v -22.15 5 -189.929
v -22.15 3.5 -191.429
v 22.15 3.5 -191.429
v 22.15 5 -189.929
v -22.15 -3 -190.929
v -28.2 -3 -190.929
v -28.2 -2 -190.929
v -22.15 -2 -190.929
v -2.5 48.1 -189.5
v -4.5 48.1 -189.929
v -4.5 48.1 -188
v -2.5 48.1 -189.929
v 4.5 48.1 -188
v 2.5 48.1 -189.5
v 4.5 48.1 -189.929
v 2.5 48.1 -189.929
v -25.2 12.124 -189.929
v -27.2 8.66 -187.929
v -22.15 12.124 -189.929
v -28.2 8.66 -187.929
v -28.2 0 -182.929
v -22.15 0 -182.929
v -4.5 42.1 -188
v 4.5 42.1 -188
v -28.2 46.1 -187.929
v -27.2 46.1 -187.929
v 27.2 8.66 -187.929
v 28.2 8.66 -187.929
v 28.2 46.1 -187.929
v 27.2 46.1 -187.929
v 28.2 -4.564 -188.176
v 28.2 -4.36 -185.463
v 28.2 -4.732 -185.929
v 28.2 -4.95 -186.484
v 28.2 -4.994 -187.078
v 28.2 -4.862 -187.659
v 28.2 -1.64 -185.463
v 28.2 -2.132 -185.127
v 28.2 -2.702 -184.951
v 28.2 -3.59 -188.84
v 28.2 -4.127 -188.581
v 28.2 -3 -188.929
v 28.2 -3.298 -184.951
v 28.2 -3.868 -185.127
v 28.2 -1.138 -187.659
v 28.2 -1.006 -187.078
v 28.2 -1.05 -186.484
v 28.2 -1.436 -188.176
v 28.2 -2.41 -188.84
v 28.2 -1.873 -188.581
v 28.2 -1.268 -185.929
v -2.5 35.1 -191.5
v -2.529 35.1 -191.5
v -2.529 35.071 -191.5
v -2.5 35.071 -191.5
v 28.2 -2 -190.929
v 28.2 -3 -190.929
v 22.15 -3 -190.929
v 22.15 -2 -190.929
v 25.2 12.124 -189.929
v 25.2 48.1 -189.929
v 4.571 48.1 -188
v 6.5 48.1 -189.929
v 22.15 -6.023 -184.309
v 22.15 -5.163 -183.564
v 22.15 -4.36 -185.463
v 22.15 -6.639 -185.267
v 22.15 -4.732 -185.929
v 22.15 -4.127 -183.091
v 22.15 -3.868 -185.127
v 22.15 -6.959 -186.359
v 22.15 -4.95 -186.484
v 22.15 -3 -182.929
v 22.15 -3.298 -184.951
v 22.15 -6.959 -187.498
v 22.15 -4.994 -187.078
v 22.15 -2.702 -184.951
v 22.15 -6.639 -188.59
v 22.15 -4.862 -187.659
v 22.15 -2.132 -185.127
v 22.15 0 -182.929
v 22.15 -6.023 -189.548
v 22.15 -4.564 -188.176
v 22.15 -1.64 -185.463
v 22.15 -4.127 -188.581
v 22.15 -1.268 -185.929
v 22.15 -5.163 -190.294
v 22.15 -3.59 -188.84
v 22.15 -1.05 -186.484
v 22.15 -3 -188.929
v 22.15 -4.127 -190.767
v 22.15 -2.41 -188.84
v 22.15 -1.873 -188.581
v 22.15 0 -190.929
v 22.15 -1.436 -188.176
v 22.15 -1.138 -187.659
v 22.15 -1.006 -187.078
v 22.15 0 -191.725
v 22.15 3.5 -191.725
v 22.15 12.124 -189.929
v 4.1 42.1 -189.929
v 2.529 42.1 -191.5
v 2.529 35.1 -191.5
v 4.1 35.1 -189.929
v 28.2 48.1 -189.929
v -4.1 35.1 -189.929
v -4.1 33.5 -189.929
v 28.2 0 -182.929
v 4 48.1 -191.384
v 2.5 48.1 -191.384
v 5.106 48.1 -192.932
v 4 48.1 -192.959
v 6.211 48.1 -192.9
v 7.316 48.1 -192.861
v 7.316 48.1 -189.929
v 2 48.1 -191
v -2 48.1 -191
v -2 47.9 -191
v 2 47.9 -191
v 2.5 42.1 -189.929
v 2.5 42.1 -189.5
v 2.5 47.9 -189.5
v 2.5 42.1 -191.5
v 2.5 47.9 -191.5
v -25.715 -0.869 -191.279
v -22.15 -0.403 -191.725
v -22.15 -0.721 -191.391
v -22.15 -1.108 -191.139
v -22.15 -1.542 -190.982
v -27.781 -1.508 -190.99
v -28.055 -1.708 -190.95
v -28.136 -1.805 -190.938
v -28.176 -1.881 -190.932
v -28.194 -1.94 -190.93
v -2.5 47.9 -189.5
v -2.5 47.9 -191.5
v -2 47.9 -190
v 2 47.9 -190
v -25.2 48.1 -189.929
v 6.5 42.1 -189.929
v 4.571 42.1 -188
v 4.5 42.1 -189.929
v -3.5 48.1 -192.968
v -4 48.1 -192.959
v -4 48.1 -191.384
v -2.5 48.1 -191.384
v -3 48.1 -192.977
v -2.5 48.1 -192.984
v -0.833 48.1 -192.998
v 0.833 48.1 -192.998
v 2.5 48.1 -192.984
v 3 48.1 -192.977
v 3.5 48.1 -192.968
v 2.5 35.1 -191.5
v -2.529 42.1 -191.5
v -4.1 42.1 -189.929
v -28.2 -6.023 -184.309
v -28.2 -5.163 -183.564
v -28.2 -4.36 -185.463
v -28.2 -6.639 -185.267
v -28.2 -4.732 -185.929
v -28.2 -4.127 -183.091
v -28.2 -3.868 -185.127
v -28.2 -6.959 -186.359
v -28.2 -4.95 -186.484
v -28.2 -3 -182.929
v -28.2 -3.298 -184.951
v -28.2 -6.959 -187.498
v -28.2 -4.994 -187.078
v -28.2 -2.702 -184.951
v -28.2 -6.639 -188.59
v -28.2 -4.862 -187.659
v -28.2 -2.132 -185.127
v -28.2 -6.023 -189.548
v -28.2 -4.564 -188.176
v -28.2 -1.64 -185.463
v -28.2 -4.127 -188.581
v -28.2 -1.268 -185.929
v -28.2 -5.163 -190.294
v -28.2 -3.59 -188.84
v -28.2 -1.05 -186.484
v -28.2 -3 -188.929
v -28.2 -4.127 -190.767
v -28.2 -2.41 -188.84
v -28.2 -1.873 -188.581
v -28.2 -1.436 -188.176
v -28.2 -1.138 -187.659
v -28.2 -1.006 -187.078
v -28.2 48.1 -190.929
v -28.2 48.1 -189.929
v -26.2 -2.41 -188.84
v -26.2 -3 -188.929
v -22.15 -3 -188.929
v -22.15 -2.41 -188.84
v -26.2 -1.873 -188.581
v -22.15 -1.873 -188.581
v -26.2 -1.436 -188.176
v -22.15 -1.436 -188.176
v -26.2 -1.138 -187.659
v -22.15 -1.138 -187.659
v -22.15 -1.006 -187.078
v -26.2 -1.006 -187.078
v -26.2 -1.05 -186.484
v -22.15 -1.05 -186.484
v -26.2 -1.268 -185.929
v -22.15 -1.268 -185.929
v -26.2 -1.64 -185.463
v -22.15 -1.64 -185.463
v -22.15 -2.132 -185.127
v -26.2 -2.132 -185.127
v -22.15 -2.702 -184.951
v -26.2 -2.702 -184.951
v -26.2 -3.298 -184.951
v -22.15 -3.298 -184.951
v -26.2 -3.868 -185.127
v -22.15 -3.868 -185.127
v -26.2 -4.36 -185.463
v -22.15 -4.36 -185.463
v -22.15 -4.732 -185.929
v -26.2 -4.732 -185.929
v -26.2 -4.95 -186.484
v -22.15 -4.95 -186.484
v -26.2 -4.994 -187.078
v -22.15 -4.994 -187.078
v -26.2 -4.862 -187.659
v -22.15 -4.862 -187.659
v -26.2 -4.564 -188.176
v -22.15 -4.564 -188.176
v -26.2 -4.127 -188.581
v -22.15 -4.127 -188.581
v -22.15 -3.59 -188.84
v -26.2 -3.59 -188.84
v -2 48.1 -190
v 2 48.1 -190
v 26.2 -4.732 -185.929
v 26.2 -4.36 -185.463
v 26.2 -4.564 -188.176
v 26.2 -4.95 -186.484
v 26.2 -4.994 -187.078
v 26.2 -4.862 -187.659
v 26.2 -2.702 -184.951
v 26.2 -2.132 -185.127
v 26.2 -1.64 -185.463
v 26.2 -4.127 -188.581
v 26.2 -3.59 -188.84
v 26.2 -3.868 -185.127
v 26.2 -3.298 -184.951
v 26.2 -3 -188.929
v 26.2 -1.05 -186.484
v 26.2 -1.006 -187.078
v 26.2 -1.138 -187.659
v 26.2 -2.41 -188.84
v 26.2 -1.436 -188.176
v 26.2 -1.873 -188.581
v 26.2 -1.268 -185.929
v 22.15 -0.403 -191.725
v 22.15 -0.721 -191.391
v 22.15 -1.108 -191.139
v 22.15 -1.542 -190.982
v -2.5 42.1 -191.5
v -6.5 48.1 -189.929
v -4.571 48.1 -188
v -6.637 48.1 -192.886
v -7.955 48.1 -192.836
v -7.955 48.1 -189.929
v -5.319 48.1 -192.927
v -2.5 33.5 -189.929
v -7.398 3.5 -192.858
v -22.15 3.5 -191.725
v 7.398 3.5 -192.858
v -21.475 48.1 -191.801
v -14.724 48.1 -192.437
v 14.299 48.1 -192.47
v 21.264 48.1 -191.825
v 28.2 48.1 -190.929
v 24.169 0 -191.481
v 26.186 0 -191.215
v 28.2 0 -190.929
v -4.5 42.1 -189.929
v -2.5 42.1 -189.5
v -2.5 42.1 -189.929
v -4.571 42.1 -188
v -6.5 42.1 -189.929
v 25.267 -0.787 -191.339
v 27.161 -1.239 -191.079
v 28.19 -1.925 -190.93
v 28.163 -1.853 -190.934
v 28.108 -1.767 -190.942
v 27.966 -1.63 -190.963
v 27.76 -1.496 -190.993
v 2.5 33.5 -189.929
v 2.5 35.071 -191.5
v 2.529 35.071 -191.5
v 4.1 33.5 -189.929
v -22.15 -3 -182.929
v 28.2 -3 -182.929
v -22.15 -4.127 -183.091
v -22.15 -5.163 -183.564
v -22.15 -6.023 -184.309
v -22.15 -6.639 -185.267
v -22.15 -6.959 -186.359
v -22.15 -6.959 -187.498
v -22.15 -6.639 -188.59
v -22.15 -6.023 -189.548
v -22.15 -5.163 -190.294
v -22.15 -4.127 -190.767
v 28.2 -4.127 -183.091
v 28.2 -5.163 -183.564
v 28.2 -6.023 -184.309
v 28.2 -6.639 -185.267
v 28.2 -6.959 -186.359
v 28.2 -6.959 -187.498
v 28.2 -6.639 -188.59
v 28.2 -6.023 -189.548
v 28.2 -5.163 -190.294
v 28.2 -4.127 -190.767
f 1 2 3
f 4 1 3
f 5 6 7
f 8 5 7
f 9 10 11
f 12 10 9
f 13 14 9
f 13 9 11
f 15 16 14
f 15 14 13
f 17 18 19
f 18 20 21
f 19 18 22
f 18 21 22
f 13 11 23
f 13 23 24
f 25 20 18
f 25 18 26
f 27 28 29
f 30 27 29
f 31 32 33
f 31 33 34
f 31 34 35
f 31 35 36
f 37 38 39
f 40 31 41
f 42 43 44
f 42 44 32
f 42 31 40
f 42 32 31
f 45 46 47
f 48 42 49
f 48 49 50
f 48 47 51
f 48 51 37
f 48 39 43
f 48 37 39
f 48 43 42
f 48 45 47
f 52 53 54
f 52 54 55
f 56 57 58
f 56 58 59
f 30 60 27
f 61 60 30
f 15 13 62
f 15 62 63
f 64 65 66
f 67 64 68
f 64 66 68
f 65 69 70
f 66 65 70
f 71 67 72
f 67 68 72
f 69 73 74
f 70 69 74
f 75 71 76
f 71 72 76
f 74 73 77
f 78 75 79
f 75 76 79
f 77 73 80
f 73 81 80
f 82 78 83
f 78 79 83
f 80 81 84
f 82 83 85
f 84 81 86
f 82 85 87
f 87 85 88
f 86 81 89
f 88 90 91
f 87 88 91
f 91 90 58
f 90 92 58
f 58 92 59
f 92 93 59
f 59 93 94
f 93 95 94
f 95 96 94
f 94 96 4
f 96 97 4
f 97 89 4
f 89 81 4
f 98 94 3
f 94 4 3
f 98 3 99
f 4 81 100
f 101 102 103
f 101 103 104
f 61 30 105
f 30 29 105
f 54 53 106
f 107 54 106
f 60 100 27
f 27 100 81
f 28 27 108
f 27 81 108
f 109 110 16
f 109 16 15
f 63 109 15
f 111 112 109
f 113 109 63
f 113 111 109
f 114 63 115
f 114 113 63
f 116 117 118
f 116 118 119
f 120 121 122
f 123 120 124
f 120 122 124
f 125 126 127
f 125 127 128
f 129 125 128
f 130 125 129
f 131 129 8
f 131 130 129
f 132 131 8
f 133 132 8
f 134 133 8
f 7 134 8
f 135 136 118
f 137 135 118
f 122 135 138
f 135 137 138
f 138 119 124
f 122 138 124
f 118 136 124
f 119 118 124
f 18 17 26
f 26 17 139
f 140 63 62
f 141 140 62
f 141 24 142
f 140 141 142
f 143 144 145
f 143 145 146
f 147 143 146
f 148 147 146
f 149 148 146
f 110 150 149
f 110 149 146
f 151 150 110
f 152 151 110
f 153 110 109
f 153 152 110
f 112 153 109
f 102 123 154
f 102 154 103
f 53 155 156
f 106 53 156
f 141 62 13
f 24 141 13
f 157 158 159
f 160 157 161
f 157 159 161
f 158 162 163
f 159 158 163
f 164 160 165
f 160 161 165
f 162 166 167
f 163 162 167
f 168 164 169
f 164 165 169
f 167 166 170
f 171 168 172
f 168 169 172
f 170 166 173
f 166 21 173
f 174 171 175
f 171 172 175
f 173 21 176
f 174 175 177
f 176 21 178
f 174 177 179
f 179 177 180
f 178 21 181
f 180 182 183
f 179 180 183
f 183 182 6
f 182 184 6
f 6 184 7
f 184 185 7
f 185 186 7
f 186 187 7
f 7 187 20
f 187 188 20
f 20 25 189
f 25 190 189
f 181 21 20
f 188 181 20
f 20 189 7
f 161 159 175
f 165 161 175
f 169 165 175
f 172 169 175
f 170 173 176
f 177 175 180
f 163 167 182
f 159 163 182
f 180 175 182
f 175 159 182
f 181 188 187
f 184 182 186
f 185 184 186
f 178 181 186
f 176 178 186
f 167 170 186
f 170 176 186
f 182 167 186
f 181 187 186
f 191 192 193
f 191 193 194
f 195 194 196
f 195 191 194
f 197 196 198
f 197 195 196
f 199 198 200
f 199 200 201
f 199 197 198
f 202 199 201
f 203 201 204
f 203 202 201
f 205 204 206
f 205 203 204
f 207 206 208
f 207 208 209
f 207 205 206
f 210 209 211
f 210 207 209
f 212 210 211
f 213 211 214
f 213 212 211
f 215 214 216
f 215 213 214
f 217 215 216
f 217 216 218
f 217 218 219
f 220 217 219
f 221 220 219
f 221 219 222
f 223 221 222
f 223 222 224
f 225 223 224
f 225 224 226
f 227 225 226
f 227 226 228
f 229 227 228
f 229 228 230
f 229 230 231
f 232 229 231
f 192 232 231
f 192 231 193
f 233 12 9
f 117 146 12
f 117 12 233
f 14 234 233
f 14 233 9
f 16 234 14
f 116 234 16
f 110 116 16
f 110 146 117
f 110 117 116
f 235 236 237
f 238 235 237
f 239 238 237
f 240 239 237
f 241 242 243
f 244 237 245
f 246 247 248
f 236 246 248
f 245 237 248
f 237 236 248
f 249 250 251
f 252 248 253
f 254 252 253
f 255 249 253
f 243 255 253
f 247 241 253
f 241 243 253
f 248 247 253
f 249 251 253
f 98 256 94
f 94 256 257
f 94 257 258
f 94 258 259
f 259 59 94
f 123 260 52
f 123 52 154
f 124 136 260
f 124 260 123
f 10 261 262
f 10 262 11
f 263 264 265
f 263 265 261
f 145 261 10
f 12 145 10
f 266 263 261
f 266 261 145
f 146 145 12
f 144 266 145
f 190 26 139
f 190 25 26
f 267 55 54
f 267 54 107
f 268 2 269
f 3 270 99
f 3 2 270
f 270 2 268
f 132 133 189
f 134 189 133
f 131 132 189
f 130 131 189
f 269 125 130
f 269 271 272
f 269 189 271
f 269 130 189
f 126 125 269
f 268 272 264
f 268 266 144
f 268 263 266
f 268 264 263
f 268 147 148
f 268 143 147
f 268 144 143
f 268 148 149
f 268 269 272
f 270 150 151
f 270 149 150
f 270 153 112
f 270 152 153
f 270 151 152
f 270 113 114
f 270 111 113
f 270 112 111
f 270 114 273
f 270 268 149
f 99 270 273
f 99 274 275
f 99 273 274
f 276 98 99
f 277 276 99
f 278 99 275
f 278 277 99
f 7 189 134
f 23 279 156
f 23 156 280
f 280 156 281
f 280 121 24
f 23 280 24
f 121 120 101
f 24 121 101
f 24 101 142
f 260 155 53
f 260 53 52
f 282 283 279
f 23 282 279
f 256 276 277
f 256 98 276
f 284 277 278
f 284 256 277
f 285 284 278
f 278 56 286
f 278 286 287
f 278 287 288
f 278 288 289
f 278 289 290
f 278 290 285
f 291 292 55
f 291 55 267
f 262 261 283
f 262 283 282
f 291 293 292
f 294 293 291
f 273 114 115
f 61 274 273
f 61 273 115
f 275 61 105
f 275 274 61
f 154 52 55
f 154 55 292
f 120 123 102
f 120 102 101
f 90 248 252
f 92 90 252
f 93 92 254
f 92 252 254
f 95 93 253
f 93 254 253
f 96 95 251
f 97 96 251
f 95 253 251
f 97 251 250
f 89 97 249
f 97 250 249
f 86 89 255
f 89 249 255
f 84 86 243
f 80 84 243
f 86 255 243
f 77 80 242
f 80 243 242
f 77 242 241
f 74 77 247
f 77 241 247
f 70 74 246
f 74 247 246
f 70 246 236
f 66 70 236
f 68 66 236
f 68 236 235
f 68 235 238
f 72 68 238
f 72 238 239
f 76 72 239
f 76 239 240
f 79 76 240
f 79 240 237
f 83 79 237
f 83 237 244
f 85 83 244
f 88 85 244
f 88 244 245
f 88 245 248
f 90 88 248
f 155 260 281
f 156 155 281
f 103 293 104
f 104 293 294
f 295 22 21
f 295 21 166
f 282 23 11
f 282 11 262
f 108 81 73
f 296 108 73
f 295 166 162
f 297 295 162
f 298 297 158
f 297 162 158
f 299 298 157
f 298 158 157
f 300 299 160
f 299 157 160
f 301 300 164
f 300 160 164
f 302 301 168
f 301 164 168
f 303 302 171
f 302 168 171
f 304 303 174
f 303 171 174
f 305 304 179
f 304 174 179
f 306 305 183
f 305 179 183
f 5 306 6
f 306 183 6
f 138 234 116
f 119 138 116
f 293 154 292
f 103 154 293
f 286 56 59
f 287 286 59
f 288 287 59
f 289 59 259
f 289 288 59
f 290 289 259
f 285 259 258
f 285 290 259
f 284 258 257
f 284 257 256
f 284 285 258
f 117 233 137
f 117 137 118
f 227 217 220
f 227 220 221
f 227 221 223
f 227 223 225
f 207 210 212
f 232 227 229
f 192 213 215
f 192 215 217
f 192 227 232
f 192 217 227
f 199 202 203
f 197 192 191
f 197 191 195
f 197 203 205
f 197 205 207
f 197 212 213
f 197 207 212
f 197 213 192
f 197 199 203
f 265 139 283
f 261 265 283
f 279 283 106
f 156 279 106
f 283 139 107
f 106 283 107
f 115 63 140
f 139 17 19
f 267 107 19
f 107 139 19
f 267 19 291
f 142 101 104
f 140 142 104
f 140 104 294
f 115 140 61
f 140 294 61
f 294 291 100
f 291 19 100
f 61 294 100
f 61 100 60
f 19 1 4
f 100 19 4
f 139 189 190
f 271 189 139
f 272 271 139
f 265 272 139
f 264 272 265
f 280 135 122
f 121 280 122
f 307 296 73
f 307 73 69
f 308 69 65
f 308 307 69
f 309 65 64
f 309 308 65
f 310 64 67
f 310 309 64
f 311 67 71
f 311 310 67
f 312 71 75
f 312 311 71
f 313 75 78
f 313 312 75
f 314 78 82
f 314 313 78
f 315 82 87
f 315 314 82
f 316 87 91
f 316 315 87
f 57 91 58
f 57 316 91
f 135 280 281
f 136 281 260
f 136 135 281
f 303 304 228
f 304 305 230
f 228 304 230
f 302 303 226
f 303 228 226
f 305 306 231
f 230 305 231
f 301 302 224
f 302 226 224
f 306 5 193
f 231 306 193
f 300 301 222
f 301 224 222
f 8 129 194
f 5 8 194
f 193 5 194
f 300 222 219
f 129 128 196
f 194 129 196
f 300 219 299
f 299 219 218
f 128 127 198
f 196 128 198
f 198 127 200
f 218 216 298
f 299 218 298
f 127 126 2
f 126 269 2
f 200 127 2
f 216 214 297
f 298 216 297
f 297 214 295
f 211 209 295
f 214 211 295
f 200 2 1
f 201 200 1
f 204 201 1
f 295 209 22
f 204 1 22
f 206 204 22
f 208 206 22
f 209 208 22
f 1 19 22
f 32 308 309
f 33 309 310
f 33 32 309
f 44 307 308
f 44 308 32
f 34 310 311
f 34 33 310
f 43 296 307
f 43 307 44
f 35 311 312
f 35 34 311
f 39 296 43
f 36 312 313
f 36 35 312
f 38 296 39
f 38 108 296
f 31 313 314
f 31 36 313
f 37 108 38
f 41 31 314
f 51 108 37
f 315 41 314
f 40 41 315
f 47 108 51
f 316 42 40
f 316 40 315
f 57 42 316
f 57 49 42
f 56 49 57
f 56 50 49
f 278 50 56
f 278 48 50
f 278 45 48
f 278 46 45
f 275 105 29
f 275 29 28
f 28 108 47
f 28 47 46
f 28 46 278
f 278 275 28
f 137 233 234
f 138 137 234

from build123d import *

# Parameters (mm, degrees)
BOSS_EXTRUDE1_DEPTH       = 48.1
SKETCH2_R                 = 2
BOSS_EXTRUDE2_DEPTH       = 6.05
CHAMFER1_SIZE2            = 7
CHAMFER1_SIZE             = 12.124355653
CHAMFER1_OF_MIRROR1_SIZE2 = 7
CHAMFER1_OF_MIRROR1_SIZE  = 12.124355653
BOSS_EXTRUDE3_DEPTH       = 1
CHAMFER2_SIZE             = 2
SKETCH4_W                 = 44.3
SKETCH4_H                 = 3.5
LITTLE_BIT_OF_SPACE_DEPTH = 57.194750645
CHAMFER3_SIZE             = 1.5
FILLET1_R                 = 2
SKETCH5_W                 = 9
SKETCH5_H                 = 1.928677783
BOSS_EXTRUDE4_DEPTH       = 6
SKETCH6_W                 = 5
SKETCH6_H                 = 2
CUT_EXTRUDE2_DEPTH        = 13
SKETCH7_W                 = 5
SKETCH7_H                 = 2
SKETCH7_W_2               = 4
SKETCH7_H_2               = 1
BOSS_EXTRUDE5_DEPTH       = 0.2
BOSS_EXTRUDE7_DEPTH       = 1.5
CHAMFER6_SIZE             = 1.5
CHAMFER7_SIZE             = 1.6
CHAMFER8_SIZE             = 2
SKETCH10_W                = 15.27160506
SKETCH10_H                = 9.874411304
CUT_EXTRUDE3_DEPTH        = 203.6826338
SKETCH11_R                = 2
BOSS_EXTRUDE8_DEPTH       = 2


# Read off the part's stored shape, not the designer's step: Boss-Extrude1
# Some blends are built 0.0001 mm under size
with BuildPart() as part:
    # Boss-Extrude1 outline → Boss-Extrude1 (new body)
    with BuildSketch(Plane(origin=(0, 0, 0), x_dir=(1, 0, 0), z_dir=(0, 1, 0))):
        with BuildLine():
            ThreePointArc((28.2, 190.928677783), (0, 193), (-28.2, 190.928677783))
            Line((-28.2, 190.928677783), (-28.2, 189.928677783))
            Line((-28.2, 189.928677783), (28.2, 189.928677783))
            Line((28.2, 189.928677783), (28.2, 190.928677783))
        make_face()
    extrude(amount=BOSS_EXTRUDE1_DEPTH)

    # Sketch2 → Boss-Extrude2 (add)
    with BuildSketch(Plane(origin=(28.2, 0, 0), x_dir=(0, 0, -1), z_dir=(1, 0, 0))):
        with BuildLine():
            Line((190.928677783, 0), (182.928677783, 0))
            Line((182.928677783, 0), (182.928677783, -3))
            ThreePointArc((182.928677783, -3), (186.928677783, -7), (190.928677783, -3))
            Line((190.928677783, -3), (190.928677783, 0))
        make_face()
        with Locations((186.928677783, -3)):
            Circle(SKETCH2_R, mode=Mode.SUBTRACT)
    boss_extrude2 = extrude(amount=-BOSS_EXTRUDE2_DEPTH)

    # Chamfer1
    chamfer1_edges = [part.edges().sort_by_distance(p)[0] for p in [
        (25.175, 0, -189.928677783),
    ]]
    chamfer1_side = [part.faces().sort_by_distance(p)[0] for p in [
        (25.175, 0.14, -189.928677783),
    ]]
    chamfer(chamfer1_edges, length=CHAMFER1_SIZE - 0.0001, length2=CHAMFER1_SIZE2 - 0.0001, reference=chamfer1_side[0])  # a hair under: the kernel refuses the full size

    # Mirror1: Boss-Extrude2 across plane
    add(boss_extrude2.mirror(Plane(origin=(0, 0, 0), x_dir=(0, 0, 1), z_dir=(1, 0, 0))))

    # Chamfer1 of Mirror1
    chamfer1_of_mirror1_edges = [part.edges().sort_by_distance(p)[0] for p in [
        (-25.175, 0, -189.928677783),
    ]]
    chamfer1_of_mirror1_side = [part.faces().sort_by_distance(p)[0] for p in [
        (-25.175, 0.14, -189.928677783),
    ]]
    chamfer(chamfer1_of_mirror1_edges, length=CHAMFER1_OF_MIRROR1_SIZE - 0.0001, length2=CHAMFER1_OF_MIRROR1_SIZE2 - 0.0001, reference=chamfer1_of_mirror1_side[0])  # a hair under: the kernel refuses the full size

    # Sketch3 → Boss-Extrude3 (add)
    with BuildSketch(Plane(origin=(28.2, 0, 0), x_dir=(0, 0, -1), z_dir=(1, 0, 0))):
        Polygon((190.928677783, 48.1), (190.928677783, 8.660254038), (187.928677783, 8.660254038), (187.928677783, 46.1), (189.928677783, 48.1), align=None)
    boss_extrude3 = extrude(amount=-BOSS_EXTRUDE3_DEPTH)

    # Mirror2: Boss-Extrude3 across plane
    add(boss_extrude3.mirror(Plane(origin=(0, 0, 0), x_dir=(0, 0, 1), z_dir=(1, 0, 0))))

    # Chamfer2
    chamfer2_edges = [part.edges().sort_by_distance(p)[0] for p in [
        (-27.2, 30.112127827, -189.928677783),
        (27.2, 30.112127827, -189.928677783),
    ]]
    chamfer(chamfer2_edges, length=CHAMFER2_SIZE - 0.0001)  # a hair under: the kernel refuses the full size

    # Sketch4 → Little bit of space (cut, through all)
    with BuildSketch(Plane.XY.offset(-189.928677783)):
        with Locations((0, 1.75)):
            Rectangle(SKETCH4_W, SKETCH4_H)
    extrude(amount=-LITTLE_BIT_OF_SPACE_DEPTH, mode=Mode.SUBTRACT)

    # Chamfer3
    chamfer3_edges = [part.edges().sort_by_distance(p)[0] for p in [
        (0, 3.5, -189.928677783),
    ]]
    chamfer(chamfer3_edges, length=CHAMFER3_SIZE)

    # Fillet1
    # the kernel refuses this fillet: 2 mm, written as the material it adds along each edge
    with BuildSketch(Plane(origin=(-33.2, 0, -190.928677783), x_dir=(0, 0, -1), z_dir=(1, 0, 0))) as fillet1_piece_1_section:
        with BuildLine():
            CenterArc((FILLET1_R, -FILLET1_R), FILLET1_R, 90, 90)
            Line((0, -FILLET1_R), (0, 0))
            Line((0, 0), (FILLET1_R, 0))
        make_face()
    fillet1_piece_1 = extrude(amount=11.05, mode=Mode.PRIVATE)
    fillet1_piece_1 = fillet1_piece_1 & Plane(origin=(0, -0.599281995, -9e-09), x_dir=(0.14611398964376573, 0, -0.9892677605332044), z_dir=(0, -1, 0)) * Cylinder(192.999999991, 31, mode=Mode.PRIVATE)
    add(fillet1_piece_1)
    with BuildSketch(Plane(origin=(33.2, 0, -190.928677783), x_dir=(0, 0, -1), z_dir=(-1, 0, 0))) as fillet1_piece_2_section:
        with BuildLine():
            CenterArc((FILLET1_R, FILLET1_R), FILLET1_R, 180, 90)
            Line((0, FILLET1_R), (0, 0))
            Line((0, 0), (FILLET1_R, 0))
        make_face()
    fillet1_piece_2 = extrude(amount=11.05, mode=Mode.PRIVATE)
    fillet1_piece_2 = fillet1_piece_2 & Plane(origin=(0, -0.599283958, -9e-09), x_dir=(0.14611398964376573, 0, -0.9892677605332044), z_dir=(0, -1, 0)) * Cylinder(192.999999991, 31, mode=Mode.PRIVATE)
    add(fillet1_piece_2)

    # Sketch5 → Boss-Extrude4 (add)
    with BuildSketch(Plane(origin=(0, 48.1, 0), x_dir=(1, 0, 0), z_dir=(0, 1, 0))):
        with Locations((0, 188.964338892)):
            Rectangle(SKETCH5_W, SKETCH5_H)
    extrude(amount=-BOSS_EXTRUDE4_DEPTH)

    # Sketch6 → Cut-Extrude2 (cut)
    with BuildSketch(Plane(origin=(0, 48.1, 0), x_dir=(1, 0, 0), z_dir=(0, 1, 0))):
        with Locations((0, 190.5)):
            Rectangle(SKETCH6_W, SKETCH6_H)
    extrude(amount=-CUT_EXTRUDE2_DEPTH, mode=Mode.SUBTRACT)

    # Sketch7 → Boss-Extrude5 (add)
    with BuildSketch(Plane(origin=(0, 48.1, 0), x_dir=(1, 0, 0), z_dir=(0, 1, 0))):
        with Locations((0, 190.5)):
            Rectangle(SKETCH7_W, SKETCH7_H)
        with Locations((0, 190.5)):
            Rectangle(SKETCH7_W_2, SKETCH7_H_2, mode=Mode.SUBTRACT)
    extrude(amount=-BOSS_EXTRUDE5_DEPTH)

    # Sketch9 → Boss-Extrude7 (add)
    with BuildSketch(Plane(origin=(0, 48.1, 0), x_dir=(1, 0, 0), z_dir=(0, 1, 0))):
        with BuildLine():
            Line((-2.5, 192.983807611), (-2.5, 191.383807611))
            Line((-2.5, 191.383807611), (2.5, 191.383807611))
            Line((2.5, 191.383807611), (2.5, 192.983807611))
            ThreePointArc((2.5, 192.983807611), (0, 193), (-2.5, 192.983807611))
        make_face()
    extrude(amount=BOSS_EXTRUDE7_DEPTH)

    # Chamfer6
    # the kernel refuses this chamfer: 1.5 mm, written as the material it adds along each edge
    with BuildSketch(Plane(origin=(-2.5, 48.1, -196.841332093), x_dir=(-0.9996219169112968, -0.02749587661058678, 0), z_dir=(0, 0, 1))) as chamfer6_piece_1_section:
        Polygon((CHAMFER6_SIZE * 0.999621916911, -CHAMFER6_SIZE * 0.0274958766106), (-CHAMFER6_SIZE * 0.0274958766106, -CHAMFER6_SIZE * 0.999621916911), (0, 0), align=None)
    chamfer6_piece_1 = extrude(amount=5.457524482, mode=Mode.PRIVATE)
    chamfer6_piece_1 = chamfer6_piece_1 & Plane(origin=(0, 48.593713067, -9e-09), x_dir=(0.14611398964402453, 0, -0.9892677605331662), z_dir=(0, -1, 0)) * Cylinder(192.999999991, 17, mode=Mode.PRIVATE)
    chamfer6_piece_1 = split(chamfer6_piece_1, bisect_by=Plane(origin=(-2.994165451, 49.6, -192.180106011), z_dir=(0, -1, 0)), keep=Keep.TOP, mode=Mode.PRIVATE)
    add(chamfer6_piece_1)
    with BuildSketch(Plane(origin=(2.5, 48.1, -191.383807611), x_dir=(0.9996219169112968, -0.02749587661058678, 0), z_dir=(0, 0, -1))) as chamfer6_piece_2_section:
        Polygon((CHAMFER6_SIZE * 0.999621916911, -CHAMFER6_SIZE * 0.0274958766106), (-CHAMFER6_SIZE * 0.0274958766106, -CHAMFER6_SIZE * 0.999621916911), (0, 0), align=None)
    chamfer6_piece_2 = extrude(amount=5.457524482, mode=Mode.PRIVATE)
    chamfer6_piece_2 = chamfer6_piece_2 & Plane(origin=(0, 48.593713067, -9e-09), x_dir=(0.14611398964402453, 0, -0.9892677605331662), z_dir=(0, -1, 0)) * Cylinder(192.999999991, 17, mode=Mode.PRIVATE)
    chamfer6_piece_2 = split(chamfer6_piece_2, bisect_by=Plane(origin=(2.994165451, 49.6, -192.180106011), z_dir=(0, -1, 0)), keep=Keep.TOP, mode=Mode.PRIVATE)
    add(chamfer6_piece_2)

    # Chamfer7
    # the kernel refuses this chamfer: 1.6 mm, written as the material it takes off along each edge
    with BuildSketch(Plane(origin=(-2.5, 42.1, -189.928677783), x_dir=(0.027495876610586577, 0, -0.9996219169112966), z_dir=(0, -1, 0))) as chamfer7_piece_1_section:
        Polygon((CHAMFER7_SIZE * 0.999621916911, -CHAMFER7_SIZE * 0.0274958766106), (-CHAMFER7_SIZE * 0.0274958766106, -CHAMFER7_SIZE * 0.999621916911), (0, 0), align=None)
    chamfer7_piece_1 = extrude(amount=7, mode=Mode.PRIVATE)
    chamfer7_piece_1 = split(chamfer7_piece_1, bisect_by=Plane(origin=(-3.029634844, 38.6, -191.5), z_dir=(0, 0, 1)), keep=Keep.TOP, mode=Mode.PRIVATE)
    add(chamfer7_piece_1, mode=Mode.SUBTRACT)
    with BuildSketch(Plane(origin=(2.5, 35.1, -189.928677783), x_dir=(-0.027495876610586306, 0, -0.9996219169112966), z_dir=(0, 1, 0))) as chamfer7_piece_2_section:
        Polygon((CHAMFER7_SIZE * 0.999621916911, -CHAMFER7_SIZE * 0.0274958766106), (-CHAMFER7_SIZE * 0.0274958766106, -CHAMFER7_SIZE * 0.999621916911), (0, 0), align=None)
    chamfer7_piece_2 = extrude(amount=7, mode=Mode.PRIVATE)
    chamfer7_piece_2 = split(chamfer7_piece_2, bisect_by=Plane(origin=(3.029634844, 38.6, -191.5), z_dir=(0, 0, 1)), keep=Keep.TOP, mode=Mode.PRIVATE)
    add(chamfer7_piece_2, mode=Mode.SUBTRACT)
    with BuildSketch(Plane(origin=(2.5, 35.1, -189.928677783), x_dir=(0, 0.027495876610587656, -0.9996219169112966), z_dir=(-1, 0, 0))) as chamfer7_piece_3_section:
        Polygon((CHAMFER7_SIZE * 0.999621916911, CHAMFER7_SIZE * 0.0274958766106), (-CHAMFER7_SIZE * 0.0274958766106, CHAMFER7_SIZE * 0.999621916911), (0, 0), align=None)
    chamfer7_piece_3 = extrude(amount=5, mode=Mode.PRIVATE)
    chamfer7_piece_3 = split(chamfer7_piece_3, bisect_by=Plane(origin=(0, 34.570365156, -191.5), z_dir=(0, 0, 1)), keep=Keep.TOP, mode=Mode.PRIVATE)
    add(chamfer7_piece_3, mode=Mode.SUBTRACT)
    with BuildSketch(Plane(origin=(-2.5, 42.1, -189.928677783), x_dir=(0.027495876610586577, 0, -0.9996219169112966), z_dir=(0, -1, 0))) as chamfer7_piece_4a_section:
        Polygon((CHAMFER7_SIZE * 0.999621916911, -CHAMFER7_SIZE * 0.0274958766106), (-CHAMFER7_SIZE * 0.0274958766106, -CHAMFER7_SIZE * 0.999621916911), (0, 0), align=None)
    chamfer7_piece_4a = extrude(amount=11.114692781, mode=Mode.PRIVATE)
    chamfer7_piece_4a = split(chamfer7_piece_4a, bisect_by=Plane(origin=(-3.029634844, 33.04265361, -191.5), z_dir=(0, 0, 1)), keep=Keep.TOP, mode=Mode.PRIVATE)
    chamfer7_piece_4a = split(chamfer7_piece_4a, bisect_by=Plane(origin=(-3.029634844, 35.1, -190.452614737), z_dir=(0, -1, 0)), keep=Keep.TOP, mode=Mode.PRIVATE)
    with BuildSketch(Plane(origin=(2.5, 35.1, -189.928677783), x_dir=(0, 0.027495876610587656, -0.9996219169112966), z_dir=(-1, 0, 0))) as chamfer7_piece_4b_section:
        Polygon((CHAMFER7_SIZE * 0.999621916911, CHAMFER7_SIZE * 0.0274958766106), (-CHAMFER7_SIZE * 0.0274958766106, CHAMFER7_SIZE * 0.999621916911), (0, 0), align=None)
    chamfer7_piece_4b = extrude(amount=9.114692781, mode=Mode.PRIVATE)
    chamfer7_piece_4b = split(chamfer7_piece_4b, bisect_by=Plane(origin=(-2.5, 34.570365156, -190.452614737), z_dir=(-1, 0, 0)), keep=Keep.TOP, mode=Mode.PRIVATE)
    chamfer7_piece_4b = split(chamfer7_piece_4b, bisect_by=Plane(origin=(-4.55734639, 34.570365156, -191.5), z_dir=(0, 0, 1)), keep=Keep.TOP, mode=Mode.PRIVATE)
    chamfer7_piece_4 = chamfer7_piece_4a & chamfer7_piece_4b
    add(chamfer7_piece_4, mode=Mode.SUBTRACT)
    with BuildSketch(Plane(origin=(6.614692781, 35.1, -189.928677783), x_dir=(0, 0.027495876610587656, -0.9996219169112966), z_dir=(-1, 0, 0))) as chamfer7_piece_5a_section:
        Polygon((CHAMFER7_SIZE * 0.999621916911, CHAMFER7_SIZE * 0.0274958766106), (-CHAMFER7_SIZE * 0.0274958766106, CHAMFER7_SIZE * 0.999621916911), (0, 0), align=None)
    chamfer7_piece_5a = extrude(amount=9.114692781, mode=Mode.PRIVATE)
    chamfer7_piece_5a = split(chamfer7_piece_5a, bisect_by=Plane(origin=(2.5, 34.570365156, -190.452614737), z_dir=(1, 0, 0)), keep=Keep.TOP, mode=Mode.PRIVATE)
    chamfer7_piece_5a = split(chamfer7_piece_5a, bisect_by=Plane(origin=(4.55734639, 34.570365156, -191.5), z_dir=(0, 0, 1)), keep=Keep.TOP, mode=Mode.PRIVATE)
    with BuildSketch(Plane(origin=(2.5, 30.985307219, -189.928677783), x_dir=(-0.027495876610586577, 0, -0.9996219169112966), z_dir=(0, 1, 0))) as chamfer7_piece_5b_section:
        Polygon((CHAMFER7_SIZE * 0.999621916911, -CHAMFER7_SIZE * 0.0274958766106), (-CHAMFER7_SIZE * 0.0274958766106, -CHAMFER7_SIZE * 0.999621916911), (0, 0), align=None)
    chamfer7_piece_5b = extrude(amount=11.114692781, mode=Mode.PRIVATE)
    chamfer7_piece_5b = split(chamfer7_piece_5b, bisect_by=Plane(origin=(3.029634844, 35.1, -190.452614737), z_dir=(0, -1, 0)), keep=Keep.TOP, mode=Mode.PRIVATE)
    chamfer7_piece_5b = split(chamfer7_piece_5b, bisect_by=Plane(origin=(3.029634844, 33.04265361, -191.5), z_dir=(0, 0, 1)), keep=Keep.TOP, mode=Mode.PRIVATE)
    chamfer7_piece_5 = chamfer7_piece_5a & chamfer7_piece_5b
    add(chamfer7_piece_5, mode=Mode.SUBTRACT)

    # Chamfer8
    # the kernel refuses this chamfer: 2 mm, written as the material it adds along each edge
    with BuildSketch(Plane(origin=(-4.5, 48.1, -189.928677783), x_dir=(-0.9996219169125519, 0, -0.027495876564955297), z_dir=(0, -1, 0))) as chamfer8_piece_1_section:
        Polygon((CHAMFER8_SIZE * 0.999621916911, -CHAMFER8_SIZE * 0.0274958766112), (-CHAMFER8_SIZE * 0.027495876565, -CHAMFER8_SIZE * 0.999621916913), (0, 0), align=None)
    chamfer8_piece_1 = extrude(amount=6, mode=Mode.PRIVATE)
    chamfer8_piece_1 = split(chamfer8_piece_1, bisect_by=Plane(origin=(-5.163599307, 45.1, -188), z_dir=(0, 0, -1)), keep=Keep.TOP, mode=Mode.PRIVATE)
    add(chamfer8_piece_1)
    with BuildSketch(Plane(origin=(4.5, 48.1, -189.928677783), x_dir=(0.9996219169125516, 0, -0.02749587656495524), z_dir=(0, -1, 0))) as chamfer8_piece_2_section:
        Polygon((CHAMFER8_SIZE * 0.999621916911, CHAMFER8_SIZE * 0.0274958766112), (-CHAMFER8_SIZE * 0.027495876565, CHAMFER8_SIZE * 0.999621916913), (0, 0), align=None)
    chamfer8_piece_2 = extrude(amount=6, mode=Mode.PRIVATE)
    chamfer8_piece_2 = split(chamfer8_piece_2, bisect_by=Plane(origin=(5.163599307, 45.1, -188), z_dir=(0, 0, -1)), keep=Keep.TOP, mode=Mode.PRIVATE)
    add(chamfer8_piece_2)

    # Sketch10 → Cut-Extrude3 (cut, through all)
    with BuildSketch(Plane(origin=(0, 48.1, 0), x_dir=(1, 0, 0), z_dir=(0, 1, 0))):
        with Locations((-0.319497541, 192.732882239)):
            Rectangle(SKETCH10_W, SKETCH10_H)
    extrude(amount=CUT_EXTRUDE3_DEPTH, mode=Mode.SUBTRACT)

    # Sketch11 → Boss-Extrude8 (add)
    with BuildSketch(Plane(origin=(28.2, 0, 0), x_dir=(0, 0, -1), z_dir=(1, 0, 0))):
        with Locations((186.928677783, -3)):
            Circle(SKETCH11_R)
    boss_extrude8 = extrude(amount=-BOSS_EXTRUDE8_DEPTH)

    # Mirror3: Boss-Extrude8 across plane
    add(boss_extrude8.mirror(Plane(origin=(0, 0, 0), x_dir=(0, 0, 1), z_dir=(1, 0, 0))))


solid = part.part
